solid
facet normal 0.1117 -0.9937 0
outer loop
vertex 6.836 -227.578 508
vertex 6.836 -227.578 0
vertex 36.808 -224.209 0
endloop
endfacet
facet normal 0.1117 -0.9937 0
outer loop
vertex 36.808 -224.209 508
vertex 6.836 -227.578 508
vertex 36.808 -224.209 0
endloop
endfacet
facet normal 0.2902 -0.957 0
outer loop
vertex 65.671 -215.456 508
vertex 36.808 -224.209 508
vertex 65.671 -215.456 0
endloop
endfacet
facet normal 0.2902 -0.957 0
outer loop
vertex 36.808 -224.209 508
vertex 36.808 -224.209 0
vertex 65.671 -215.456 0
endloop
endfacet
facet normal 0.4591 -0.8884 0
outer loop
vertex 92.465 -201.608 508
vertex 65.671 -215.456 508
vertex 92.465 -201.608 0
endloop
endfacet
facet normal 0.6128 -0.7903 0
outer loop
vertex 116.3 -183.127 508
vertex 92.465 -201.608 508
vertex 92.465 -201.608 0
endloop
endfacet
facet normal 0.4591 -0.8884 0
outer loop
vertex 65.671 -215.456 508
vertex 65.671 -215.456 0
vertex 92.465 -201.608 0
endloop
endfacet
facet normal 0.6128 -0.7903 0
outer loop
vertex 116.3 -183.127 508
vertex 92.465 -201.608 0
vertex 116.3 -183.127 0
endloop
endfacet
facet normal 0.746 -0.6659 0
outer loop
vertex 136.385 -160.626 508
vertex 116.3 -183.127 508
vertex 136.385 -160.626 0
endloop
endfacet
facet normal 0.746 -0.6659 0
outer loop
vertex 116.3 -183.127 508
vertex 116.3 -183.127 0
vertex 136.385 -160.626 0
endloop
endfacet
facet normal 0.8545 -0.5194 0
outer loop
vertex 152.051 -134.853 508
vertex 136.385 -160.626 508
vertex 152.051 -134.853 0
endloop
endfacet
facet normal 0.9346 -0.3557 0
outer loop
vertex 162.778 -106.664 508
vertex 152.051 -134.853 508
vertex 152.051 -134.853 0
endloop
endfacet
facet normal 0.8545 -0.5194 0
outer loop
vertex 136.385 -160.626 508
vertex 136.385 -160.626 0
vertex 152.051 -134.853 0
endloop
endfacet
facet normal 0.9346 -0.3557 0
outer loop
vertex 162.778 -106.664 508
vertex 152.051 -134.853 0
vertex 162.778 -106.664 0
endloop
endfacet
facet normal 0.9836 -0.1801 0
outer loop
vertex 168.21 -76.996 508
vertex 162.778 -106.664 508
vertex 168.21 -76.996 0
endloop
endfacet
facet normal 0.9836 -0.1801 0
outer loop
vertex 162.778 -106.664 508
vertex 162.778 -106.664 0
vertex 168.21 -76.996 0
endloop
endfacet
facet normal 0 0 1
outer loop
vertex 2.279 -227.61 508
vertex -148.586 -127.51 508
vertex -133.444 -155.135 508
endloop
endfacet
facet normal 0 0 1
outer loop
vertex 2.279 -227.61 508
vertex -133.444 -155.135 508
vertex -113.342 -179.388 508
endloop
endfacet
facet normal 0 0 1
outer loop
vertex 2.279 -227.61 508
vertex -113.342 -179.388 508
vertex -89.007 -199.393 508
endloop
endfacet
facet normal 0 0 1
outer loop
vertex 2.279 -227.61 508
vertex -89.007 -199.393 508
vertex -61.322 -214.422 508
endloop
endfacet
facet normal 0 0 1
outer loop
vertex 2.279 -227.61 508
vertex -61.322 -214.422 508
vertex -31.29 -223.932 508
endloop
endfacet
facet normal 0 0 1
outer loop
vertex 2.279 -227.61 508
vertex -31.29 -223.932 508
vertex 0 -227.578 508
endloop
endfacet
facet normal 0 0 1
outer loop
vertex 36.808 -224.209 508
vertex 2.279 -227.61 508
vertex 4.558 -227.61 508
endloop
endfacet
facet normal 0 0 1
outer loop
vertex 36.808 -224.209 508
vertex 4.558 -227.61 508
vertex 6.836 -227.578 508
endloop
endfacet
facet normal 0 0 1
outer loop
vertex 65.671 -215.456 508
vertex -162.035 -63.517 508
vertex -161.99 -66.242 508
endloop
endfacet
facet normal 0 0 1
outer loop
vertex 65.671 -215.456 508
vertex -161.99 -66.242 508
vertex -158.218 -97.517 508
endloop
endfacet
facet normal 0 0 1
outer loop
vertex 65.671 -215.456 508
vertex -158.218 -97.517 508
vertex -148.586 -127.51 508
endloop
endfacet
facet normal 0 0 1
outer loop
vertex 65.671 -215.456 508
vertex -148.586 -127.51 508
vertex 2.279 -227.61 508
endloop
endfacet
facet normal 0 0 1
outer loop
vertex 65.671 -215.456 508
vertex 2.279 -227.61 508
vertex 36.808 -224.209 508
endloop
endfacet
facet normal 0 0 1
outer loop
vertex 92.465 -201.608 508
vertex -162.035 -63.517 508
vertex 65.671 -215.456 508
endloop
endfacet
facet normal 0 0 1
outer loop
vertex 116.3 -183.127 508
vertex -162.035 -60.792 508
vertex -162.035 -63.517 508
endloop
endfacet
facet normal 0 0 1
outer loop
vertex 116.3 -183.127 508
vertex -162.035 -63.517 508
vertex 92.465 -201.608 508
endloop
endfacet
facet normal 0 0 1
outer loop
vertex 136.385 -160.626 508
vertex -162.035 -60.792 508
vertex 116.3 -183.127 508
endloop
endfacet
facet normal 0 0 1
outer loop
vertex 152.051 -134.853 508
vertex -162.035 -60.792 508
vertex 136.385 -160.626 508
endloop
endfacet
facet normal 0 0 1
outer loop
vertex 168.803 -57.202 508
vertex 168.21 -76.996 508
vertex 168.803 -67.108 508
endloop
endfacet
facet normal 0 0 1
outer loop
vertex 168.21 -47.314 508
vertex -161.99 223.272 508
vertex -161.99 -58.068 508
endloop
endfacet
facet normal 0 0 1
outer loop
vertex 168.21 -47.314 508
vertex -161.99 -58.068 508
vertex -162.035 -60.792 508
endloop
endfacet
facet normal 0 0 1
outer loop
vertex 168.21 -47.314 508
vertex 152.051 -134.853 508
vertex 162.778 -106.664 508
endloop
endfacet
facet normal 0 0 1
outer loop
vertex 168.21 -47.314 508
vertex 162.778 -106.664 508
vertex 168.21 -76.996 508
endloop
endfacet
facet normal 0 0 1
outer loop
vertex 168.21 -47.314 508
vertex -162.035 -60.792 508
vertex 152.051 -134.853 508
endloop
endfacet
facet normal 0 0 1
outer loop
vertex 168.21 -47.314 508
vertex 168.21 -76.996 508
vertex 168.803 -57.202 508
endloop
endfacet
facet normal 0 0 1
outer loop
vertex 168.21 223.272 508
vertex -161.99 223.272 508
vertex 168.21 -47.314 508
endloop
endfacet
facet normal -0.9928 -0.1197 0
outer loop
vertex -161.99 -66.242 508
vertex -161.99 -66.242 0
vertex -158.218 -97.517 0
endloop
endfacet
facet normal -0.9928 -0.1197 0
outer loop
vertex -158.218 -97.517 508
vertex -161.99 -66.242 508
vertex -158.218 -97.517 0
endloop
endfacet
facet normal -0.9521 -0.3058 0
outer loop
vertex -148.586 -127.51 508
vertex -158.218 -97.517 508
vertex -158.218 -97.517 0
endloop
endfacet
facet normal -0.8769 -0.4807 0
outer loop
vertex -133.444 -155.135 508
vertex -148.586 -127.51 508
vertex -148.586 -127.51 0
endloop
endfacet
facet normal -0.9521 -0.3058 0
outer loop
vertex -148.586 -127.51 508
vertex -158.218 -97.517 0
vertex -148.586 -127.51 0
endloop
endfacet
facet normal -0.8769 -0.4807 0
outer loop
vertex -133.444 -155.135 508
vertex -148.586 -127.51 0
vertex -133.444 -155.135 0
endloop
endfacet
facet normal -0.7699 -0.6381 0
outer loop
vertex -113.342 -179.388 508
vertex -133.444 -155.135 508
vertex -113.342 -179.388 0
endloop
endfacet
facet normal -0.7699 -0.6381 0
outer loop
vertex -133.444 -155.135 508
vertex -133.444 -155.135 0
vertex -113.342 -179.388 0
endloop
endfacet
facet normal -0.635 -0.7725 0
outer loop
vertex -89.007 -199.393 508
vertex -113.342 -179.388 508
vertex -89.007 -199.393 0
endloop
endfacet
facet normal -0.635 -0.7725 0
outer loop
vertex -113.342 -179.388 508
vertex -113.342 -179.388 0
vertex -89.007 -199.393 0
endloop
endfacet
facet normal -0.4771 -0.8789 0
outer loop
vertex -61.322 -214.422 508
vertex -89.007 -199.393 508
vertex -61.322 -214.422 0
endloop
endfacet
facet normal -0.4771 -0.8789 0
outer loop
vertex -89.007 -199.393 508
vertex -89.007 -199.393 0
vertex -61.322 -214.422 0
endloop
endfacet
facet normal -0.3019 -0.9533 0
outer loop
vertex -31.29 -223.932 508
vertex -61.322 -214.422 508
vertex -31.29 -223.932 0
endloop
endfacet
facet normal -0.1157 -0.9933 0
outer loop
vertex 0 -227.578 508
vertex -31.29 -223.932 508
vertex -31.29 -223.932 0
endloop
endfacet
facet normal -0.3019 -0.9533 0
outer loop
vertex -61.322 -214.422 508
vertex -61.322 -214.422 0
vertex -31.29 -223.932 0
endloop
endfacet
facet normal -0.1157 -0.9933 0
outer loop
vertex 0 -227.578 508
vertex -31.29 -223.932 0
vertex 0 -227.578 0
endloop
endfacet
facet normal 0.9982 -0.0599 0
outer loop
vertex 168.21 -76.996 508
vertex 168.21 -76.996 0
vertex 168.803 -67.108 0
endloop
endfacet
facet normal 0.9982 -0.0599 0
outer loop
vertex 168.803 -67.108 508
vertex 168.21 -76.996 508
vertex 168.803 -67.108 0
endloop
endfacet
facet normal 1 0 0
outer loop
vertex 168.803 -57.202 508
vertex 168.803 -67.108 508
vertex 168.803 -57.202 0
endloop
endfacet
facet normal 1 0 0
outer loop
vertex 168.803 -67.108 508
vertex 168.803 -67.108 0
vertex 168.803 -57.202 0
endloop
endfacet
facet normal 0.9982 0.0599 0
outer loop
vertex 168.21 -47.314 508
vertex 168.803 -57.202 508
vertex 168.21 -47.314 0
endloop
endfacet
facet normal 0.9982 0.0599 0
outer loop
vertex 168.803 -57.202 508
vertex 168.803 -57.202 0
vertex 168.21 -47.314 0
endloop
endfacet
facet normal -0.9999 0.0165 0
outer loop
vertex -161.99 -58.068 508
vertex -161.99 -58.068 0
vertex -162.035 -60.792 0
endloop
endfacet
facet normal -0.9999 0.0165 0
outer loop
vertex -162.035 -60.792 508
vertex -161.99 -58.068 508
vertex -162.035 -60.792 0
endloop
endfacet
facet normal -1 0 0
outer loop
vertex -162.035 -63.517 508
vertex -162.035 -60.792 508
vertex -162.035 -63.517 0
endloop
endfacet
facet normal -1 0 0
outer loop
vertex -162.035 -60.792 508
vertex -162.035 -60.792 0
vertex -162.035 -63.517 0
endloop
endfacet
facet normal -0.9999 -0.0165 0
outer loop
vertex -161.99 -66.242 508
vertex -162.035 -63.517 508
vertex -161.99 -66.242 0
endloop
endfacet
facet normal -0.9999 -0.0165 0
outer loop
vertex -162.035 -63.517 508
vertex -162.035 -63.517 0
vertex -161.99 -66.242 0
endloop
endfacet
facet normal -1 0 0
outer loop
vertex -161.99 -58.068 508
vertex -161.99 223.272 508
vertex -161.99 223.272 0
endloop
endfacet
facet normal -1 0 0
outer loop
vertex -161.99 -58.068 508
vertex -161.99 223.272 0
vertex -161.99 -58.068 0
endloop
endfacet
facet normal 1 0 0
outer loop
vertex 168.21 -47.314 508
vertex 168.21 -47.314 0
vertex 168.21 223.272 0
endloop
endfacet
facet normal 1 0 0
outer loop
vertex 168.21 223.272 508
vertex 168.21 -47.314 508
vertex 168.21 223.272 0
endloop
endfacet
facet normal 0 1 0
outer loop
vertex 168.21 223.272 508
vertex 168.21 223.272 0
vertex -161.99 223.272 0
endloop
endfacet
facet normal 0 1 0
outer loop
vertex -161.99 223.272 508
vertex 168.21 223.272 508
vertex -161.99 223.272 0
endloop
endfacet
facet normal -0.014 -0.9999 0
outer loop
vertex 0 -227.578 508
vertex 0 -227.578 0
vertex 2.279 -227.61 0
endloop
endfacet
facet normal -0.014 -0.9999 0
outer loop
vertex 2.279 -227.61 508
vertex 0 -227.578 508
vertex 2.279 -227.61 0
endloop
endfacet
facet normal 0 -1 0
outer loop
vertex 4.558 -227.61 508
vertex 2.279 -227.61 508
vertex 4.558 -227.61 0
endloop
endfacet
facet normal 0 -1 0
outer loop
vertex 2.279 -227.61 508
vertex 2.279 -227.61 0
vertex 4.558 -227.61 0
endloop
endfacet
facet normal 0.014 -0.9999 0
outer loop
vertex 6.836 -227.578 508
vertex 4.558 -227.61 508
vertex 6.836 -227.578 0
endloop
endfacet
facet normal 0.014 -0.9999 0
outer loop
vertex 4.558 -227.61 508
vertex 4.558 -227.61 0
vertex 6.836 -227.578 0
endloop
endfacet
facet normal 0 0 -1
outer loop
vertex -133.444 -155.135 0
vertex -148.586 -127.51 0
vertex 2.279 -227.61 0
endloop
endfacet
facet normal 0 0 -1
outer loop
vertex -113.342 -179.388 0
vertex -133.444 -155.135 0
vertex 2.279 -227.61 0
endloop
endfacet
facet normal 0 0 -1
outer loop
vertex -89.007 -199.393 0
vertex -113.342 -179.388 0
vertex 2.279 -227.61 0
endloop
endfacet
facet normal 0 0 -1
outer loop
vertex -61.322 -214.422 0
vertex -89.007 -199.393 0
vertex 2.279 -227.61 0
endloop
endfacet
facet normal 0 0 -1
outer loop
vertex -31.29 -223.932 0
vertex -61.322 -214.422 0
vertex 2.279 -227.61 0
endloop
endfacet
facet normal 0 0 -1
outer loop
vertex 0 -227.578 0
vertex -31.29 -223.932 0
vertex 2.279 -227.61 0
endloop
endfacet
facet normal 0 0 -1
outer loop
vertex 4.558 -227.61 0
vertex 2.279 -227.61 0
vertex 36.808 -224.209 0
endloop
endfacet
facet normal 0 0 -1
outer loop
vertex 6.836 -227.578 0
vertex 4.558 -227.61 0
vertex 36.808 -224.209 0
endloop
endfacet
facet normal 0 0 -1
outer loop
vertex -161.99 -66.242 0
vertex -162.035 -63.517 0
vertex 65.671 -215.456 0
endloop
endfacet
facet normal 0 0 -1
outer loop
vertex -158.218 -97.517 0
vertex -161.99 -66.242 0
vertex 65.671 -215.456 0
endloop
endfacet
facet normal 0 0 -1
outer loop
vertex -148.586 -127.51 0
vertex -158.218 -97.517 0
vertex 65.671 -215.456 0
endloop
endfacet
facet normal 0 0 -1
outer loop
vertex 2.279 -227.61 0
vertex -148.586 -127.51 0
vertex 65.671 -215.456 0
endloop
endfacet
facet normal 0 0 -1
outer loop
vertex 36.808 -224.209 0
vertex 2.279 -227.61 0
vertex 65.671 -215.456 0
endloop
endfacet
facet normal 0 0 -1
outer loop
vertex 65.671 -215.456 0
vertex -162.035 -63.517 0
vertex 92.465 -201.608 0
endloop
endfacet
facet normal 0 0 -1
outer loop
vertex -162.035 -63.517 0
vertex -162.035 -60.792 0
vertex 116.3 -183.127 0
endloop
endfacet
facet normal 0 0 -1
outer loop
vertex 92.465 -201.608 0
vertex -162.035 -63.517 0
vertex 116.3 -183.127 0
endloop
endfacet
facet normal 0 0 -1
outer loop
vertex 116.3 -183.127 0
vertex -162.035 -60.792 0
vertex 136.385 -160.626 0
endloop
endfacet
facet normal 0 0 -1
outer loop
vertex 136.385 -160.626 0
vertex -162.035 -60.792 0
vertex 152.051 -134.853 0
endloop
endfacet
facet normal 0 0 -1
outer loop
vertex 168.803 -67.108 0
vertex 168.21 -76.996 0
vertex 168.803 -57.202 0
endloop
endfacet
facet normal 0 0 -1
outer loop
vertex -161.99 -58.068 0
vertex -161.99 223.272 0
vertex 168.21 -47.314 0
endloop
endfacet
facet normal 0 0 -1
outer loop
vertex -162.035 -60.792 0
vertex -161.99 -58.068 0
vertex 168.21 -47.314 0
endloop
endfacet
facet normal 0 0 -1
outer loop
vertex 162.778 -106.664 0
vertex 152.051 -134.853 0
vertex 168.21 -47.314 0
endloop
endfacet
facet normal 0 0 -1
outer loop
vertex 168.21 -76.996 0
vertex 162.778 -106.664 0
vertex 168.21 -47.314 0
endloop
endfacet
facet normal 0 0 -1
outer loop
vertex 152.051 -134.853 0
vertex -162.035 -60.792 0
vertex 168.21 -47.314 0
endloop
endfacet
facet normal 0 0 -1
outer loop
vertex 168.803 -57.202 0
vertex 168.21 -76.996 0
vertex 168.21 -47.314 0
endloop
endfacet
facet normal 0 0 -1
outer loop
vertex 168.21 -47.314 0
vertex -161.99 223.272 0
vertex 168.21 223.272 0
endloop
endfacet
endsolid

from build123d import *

# Parameters (mm, degrees)
F1_DEPTH = 508


with BuildPart() as f1:
    # F0 (on Top) → F1 (new body)
    with BuildSketch(Plane.XY):
        with BuildLine():
            Line((168.20993, 223.271681), (-161.99007, 223.271681))
            Line((-161.99007, 223.271681), (-161.99007, -58.067597))
            Line((-161.99007, -58.067597), (-161.99007, -66.242225))
            ThreePointArc((-161.99007, -66.242225), (-113.341942, -179.388298), (0, -227.578319))
            Line((0, -227.578319), (6.836314, -227.578319))
            ThreePointArc((6.836314, -227.578319), (116.300399, -183.126755), (168.20993, -76.996043))
            Line((168.20993, -76.996043), (168.20993, -47.313779))
            Line((168.20993, -47.313779), (168.20993, 223.271681))
        make_face()
        with BuildLine():
            Line((-161.99007, -66.242225), (-161.99007, -58.067597))
            ThreePointArc((-161.99007, -58.067597), (-162.040562, -62.154911), (-161.99007, -66.242225))
        make_face()
        with BuildLine():
            ThreePointArc((168.20993, -76.996043), (168.876876, -62.154911), (168.20993, -47.313779))
            Line((168.20993, -47.313779), (168.20993, -76.996043))
        make_face()
        with BuildLine():
            Line((6.836314, -227.578319), (0, -227.578319))
            ThreePointArc((0, -227.578319), (3.418157, -227.61363), (6.836314, -227.578319))
        make_face()
    extrude(amount=F1_DEPTH)


solid = f1.part
